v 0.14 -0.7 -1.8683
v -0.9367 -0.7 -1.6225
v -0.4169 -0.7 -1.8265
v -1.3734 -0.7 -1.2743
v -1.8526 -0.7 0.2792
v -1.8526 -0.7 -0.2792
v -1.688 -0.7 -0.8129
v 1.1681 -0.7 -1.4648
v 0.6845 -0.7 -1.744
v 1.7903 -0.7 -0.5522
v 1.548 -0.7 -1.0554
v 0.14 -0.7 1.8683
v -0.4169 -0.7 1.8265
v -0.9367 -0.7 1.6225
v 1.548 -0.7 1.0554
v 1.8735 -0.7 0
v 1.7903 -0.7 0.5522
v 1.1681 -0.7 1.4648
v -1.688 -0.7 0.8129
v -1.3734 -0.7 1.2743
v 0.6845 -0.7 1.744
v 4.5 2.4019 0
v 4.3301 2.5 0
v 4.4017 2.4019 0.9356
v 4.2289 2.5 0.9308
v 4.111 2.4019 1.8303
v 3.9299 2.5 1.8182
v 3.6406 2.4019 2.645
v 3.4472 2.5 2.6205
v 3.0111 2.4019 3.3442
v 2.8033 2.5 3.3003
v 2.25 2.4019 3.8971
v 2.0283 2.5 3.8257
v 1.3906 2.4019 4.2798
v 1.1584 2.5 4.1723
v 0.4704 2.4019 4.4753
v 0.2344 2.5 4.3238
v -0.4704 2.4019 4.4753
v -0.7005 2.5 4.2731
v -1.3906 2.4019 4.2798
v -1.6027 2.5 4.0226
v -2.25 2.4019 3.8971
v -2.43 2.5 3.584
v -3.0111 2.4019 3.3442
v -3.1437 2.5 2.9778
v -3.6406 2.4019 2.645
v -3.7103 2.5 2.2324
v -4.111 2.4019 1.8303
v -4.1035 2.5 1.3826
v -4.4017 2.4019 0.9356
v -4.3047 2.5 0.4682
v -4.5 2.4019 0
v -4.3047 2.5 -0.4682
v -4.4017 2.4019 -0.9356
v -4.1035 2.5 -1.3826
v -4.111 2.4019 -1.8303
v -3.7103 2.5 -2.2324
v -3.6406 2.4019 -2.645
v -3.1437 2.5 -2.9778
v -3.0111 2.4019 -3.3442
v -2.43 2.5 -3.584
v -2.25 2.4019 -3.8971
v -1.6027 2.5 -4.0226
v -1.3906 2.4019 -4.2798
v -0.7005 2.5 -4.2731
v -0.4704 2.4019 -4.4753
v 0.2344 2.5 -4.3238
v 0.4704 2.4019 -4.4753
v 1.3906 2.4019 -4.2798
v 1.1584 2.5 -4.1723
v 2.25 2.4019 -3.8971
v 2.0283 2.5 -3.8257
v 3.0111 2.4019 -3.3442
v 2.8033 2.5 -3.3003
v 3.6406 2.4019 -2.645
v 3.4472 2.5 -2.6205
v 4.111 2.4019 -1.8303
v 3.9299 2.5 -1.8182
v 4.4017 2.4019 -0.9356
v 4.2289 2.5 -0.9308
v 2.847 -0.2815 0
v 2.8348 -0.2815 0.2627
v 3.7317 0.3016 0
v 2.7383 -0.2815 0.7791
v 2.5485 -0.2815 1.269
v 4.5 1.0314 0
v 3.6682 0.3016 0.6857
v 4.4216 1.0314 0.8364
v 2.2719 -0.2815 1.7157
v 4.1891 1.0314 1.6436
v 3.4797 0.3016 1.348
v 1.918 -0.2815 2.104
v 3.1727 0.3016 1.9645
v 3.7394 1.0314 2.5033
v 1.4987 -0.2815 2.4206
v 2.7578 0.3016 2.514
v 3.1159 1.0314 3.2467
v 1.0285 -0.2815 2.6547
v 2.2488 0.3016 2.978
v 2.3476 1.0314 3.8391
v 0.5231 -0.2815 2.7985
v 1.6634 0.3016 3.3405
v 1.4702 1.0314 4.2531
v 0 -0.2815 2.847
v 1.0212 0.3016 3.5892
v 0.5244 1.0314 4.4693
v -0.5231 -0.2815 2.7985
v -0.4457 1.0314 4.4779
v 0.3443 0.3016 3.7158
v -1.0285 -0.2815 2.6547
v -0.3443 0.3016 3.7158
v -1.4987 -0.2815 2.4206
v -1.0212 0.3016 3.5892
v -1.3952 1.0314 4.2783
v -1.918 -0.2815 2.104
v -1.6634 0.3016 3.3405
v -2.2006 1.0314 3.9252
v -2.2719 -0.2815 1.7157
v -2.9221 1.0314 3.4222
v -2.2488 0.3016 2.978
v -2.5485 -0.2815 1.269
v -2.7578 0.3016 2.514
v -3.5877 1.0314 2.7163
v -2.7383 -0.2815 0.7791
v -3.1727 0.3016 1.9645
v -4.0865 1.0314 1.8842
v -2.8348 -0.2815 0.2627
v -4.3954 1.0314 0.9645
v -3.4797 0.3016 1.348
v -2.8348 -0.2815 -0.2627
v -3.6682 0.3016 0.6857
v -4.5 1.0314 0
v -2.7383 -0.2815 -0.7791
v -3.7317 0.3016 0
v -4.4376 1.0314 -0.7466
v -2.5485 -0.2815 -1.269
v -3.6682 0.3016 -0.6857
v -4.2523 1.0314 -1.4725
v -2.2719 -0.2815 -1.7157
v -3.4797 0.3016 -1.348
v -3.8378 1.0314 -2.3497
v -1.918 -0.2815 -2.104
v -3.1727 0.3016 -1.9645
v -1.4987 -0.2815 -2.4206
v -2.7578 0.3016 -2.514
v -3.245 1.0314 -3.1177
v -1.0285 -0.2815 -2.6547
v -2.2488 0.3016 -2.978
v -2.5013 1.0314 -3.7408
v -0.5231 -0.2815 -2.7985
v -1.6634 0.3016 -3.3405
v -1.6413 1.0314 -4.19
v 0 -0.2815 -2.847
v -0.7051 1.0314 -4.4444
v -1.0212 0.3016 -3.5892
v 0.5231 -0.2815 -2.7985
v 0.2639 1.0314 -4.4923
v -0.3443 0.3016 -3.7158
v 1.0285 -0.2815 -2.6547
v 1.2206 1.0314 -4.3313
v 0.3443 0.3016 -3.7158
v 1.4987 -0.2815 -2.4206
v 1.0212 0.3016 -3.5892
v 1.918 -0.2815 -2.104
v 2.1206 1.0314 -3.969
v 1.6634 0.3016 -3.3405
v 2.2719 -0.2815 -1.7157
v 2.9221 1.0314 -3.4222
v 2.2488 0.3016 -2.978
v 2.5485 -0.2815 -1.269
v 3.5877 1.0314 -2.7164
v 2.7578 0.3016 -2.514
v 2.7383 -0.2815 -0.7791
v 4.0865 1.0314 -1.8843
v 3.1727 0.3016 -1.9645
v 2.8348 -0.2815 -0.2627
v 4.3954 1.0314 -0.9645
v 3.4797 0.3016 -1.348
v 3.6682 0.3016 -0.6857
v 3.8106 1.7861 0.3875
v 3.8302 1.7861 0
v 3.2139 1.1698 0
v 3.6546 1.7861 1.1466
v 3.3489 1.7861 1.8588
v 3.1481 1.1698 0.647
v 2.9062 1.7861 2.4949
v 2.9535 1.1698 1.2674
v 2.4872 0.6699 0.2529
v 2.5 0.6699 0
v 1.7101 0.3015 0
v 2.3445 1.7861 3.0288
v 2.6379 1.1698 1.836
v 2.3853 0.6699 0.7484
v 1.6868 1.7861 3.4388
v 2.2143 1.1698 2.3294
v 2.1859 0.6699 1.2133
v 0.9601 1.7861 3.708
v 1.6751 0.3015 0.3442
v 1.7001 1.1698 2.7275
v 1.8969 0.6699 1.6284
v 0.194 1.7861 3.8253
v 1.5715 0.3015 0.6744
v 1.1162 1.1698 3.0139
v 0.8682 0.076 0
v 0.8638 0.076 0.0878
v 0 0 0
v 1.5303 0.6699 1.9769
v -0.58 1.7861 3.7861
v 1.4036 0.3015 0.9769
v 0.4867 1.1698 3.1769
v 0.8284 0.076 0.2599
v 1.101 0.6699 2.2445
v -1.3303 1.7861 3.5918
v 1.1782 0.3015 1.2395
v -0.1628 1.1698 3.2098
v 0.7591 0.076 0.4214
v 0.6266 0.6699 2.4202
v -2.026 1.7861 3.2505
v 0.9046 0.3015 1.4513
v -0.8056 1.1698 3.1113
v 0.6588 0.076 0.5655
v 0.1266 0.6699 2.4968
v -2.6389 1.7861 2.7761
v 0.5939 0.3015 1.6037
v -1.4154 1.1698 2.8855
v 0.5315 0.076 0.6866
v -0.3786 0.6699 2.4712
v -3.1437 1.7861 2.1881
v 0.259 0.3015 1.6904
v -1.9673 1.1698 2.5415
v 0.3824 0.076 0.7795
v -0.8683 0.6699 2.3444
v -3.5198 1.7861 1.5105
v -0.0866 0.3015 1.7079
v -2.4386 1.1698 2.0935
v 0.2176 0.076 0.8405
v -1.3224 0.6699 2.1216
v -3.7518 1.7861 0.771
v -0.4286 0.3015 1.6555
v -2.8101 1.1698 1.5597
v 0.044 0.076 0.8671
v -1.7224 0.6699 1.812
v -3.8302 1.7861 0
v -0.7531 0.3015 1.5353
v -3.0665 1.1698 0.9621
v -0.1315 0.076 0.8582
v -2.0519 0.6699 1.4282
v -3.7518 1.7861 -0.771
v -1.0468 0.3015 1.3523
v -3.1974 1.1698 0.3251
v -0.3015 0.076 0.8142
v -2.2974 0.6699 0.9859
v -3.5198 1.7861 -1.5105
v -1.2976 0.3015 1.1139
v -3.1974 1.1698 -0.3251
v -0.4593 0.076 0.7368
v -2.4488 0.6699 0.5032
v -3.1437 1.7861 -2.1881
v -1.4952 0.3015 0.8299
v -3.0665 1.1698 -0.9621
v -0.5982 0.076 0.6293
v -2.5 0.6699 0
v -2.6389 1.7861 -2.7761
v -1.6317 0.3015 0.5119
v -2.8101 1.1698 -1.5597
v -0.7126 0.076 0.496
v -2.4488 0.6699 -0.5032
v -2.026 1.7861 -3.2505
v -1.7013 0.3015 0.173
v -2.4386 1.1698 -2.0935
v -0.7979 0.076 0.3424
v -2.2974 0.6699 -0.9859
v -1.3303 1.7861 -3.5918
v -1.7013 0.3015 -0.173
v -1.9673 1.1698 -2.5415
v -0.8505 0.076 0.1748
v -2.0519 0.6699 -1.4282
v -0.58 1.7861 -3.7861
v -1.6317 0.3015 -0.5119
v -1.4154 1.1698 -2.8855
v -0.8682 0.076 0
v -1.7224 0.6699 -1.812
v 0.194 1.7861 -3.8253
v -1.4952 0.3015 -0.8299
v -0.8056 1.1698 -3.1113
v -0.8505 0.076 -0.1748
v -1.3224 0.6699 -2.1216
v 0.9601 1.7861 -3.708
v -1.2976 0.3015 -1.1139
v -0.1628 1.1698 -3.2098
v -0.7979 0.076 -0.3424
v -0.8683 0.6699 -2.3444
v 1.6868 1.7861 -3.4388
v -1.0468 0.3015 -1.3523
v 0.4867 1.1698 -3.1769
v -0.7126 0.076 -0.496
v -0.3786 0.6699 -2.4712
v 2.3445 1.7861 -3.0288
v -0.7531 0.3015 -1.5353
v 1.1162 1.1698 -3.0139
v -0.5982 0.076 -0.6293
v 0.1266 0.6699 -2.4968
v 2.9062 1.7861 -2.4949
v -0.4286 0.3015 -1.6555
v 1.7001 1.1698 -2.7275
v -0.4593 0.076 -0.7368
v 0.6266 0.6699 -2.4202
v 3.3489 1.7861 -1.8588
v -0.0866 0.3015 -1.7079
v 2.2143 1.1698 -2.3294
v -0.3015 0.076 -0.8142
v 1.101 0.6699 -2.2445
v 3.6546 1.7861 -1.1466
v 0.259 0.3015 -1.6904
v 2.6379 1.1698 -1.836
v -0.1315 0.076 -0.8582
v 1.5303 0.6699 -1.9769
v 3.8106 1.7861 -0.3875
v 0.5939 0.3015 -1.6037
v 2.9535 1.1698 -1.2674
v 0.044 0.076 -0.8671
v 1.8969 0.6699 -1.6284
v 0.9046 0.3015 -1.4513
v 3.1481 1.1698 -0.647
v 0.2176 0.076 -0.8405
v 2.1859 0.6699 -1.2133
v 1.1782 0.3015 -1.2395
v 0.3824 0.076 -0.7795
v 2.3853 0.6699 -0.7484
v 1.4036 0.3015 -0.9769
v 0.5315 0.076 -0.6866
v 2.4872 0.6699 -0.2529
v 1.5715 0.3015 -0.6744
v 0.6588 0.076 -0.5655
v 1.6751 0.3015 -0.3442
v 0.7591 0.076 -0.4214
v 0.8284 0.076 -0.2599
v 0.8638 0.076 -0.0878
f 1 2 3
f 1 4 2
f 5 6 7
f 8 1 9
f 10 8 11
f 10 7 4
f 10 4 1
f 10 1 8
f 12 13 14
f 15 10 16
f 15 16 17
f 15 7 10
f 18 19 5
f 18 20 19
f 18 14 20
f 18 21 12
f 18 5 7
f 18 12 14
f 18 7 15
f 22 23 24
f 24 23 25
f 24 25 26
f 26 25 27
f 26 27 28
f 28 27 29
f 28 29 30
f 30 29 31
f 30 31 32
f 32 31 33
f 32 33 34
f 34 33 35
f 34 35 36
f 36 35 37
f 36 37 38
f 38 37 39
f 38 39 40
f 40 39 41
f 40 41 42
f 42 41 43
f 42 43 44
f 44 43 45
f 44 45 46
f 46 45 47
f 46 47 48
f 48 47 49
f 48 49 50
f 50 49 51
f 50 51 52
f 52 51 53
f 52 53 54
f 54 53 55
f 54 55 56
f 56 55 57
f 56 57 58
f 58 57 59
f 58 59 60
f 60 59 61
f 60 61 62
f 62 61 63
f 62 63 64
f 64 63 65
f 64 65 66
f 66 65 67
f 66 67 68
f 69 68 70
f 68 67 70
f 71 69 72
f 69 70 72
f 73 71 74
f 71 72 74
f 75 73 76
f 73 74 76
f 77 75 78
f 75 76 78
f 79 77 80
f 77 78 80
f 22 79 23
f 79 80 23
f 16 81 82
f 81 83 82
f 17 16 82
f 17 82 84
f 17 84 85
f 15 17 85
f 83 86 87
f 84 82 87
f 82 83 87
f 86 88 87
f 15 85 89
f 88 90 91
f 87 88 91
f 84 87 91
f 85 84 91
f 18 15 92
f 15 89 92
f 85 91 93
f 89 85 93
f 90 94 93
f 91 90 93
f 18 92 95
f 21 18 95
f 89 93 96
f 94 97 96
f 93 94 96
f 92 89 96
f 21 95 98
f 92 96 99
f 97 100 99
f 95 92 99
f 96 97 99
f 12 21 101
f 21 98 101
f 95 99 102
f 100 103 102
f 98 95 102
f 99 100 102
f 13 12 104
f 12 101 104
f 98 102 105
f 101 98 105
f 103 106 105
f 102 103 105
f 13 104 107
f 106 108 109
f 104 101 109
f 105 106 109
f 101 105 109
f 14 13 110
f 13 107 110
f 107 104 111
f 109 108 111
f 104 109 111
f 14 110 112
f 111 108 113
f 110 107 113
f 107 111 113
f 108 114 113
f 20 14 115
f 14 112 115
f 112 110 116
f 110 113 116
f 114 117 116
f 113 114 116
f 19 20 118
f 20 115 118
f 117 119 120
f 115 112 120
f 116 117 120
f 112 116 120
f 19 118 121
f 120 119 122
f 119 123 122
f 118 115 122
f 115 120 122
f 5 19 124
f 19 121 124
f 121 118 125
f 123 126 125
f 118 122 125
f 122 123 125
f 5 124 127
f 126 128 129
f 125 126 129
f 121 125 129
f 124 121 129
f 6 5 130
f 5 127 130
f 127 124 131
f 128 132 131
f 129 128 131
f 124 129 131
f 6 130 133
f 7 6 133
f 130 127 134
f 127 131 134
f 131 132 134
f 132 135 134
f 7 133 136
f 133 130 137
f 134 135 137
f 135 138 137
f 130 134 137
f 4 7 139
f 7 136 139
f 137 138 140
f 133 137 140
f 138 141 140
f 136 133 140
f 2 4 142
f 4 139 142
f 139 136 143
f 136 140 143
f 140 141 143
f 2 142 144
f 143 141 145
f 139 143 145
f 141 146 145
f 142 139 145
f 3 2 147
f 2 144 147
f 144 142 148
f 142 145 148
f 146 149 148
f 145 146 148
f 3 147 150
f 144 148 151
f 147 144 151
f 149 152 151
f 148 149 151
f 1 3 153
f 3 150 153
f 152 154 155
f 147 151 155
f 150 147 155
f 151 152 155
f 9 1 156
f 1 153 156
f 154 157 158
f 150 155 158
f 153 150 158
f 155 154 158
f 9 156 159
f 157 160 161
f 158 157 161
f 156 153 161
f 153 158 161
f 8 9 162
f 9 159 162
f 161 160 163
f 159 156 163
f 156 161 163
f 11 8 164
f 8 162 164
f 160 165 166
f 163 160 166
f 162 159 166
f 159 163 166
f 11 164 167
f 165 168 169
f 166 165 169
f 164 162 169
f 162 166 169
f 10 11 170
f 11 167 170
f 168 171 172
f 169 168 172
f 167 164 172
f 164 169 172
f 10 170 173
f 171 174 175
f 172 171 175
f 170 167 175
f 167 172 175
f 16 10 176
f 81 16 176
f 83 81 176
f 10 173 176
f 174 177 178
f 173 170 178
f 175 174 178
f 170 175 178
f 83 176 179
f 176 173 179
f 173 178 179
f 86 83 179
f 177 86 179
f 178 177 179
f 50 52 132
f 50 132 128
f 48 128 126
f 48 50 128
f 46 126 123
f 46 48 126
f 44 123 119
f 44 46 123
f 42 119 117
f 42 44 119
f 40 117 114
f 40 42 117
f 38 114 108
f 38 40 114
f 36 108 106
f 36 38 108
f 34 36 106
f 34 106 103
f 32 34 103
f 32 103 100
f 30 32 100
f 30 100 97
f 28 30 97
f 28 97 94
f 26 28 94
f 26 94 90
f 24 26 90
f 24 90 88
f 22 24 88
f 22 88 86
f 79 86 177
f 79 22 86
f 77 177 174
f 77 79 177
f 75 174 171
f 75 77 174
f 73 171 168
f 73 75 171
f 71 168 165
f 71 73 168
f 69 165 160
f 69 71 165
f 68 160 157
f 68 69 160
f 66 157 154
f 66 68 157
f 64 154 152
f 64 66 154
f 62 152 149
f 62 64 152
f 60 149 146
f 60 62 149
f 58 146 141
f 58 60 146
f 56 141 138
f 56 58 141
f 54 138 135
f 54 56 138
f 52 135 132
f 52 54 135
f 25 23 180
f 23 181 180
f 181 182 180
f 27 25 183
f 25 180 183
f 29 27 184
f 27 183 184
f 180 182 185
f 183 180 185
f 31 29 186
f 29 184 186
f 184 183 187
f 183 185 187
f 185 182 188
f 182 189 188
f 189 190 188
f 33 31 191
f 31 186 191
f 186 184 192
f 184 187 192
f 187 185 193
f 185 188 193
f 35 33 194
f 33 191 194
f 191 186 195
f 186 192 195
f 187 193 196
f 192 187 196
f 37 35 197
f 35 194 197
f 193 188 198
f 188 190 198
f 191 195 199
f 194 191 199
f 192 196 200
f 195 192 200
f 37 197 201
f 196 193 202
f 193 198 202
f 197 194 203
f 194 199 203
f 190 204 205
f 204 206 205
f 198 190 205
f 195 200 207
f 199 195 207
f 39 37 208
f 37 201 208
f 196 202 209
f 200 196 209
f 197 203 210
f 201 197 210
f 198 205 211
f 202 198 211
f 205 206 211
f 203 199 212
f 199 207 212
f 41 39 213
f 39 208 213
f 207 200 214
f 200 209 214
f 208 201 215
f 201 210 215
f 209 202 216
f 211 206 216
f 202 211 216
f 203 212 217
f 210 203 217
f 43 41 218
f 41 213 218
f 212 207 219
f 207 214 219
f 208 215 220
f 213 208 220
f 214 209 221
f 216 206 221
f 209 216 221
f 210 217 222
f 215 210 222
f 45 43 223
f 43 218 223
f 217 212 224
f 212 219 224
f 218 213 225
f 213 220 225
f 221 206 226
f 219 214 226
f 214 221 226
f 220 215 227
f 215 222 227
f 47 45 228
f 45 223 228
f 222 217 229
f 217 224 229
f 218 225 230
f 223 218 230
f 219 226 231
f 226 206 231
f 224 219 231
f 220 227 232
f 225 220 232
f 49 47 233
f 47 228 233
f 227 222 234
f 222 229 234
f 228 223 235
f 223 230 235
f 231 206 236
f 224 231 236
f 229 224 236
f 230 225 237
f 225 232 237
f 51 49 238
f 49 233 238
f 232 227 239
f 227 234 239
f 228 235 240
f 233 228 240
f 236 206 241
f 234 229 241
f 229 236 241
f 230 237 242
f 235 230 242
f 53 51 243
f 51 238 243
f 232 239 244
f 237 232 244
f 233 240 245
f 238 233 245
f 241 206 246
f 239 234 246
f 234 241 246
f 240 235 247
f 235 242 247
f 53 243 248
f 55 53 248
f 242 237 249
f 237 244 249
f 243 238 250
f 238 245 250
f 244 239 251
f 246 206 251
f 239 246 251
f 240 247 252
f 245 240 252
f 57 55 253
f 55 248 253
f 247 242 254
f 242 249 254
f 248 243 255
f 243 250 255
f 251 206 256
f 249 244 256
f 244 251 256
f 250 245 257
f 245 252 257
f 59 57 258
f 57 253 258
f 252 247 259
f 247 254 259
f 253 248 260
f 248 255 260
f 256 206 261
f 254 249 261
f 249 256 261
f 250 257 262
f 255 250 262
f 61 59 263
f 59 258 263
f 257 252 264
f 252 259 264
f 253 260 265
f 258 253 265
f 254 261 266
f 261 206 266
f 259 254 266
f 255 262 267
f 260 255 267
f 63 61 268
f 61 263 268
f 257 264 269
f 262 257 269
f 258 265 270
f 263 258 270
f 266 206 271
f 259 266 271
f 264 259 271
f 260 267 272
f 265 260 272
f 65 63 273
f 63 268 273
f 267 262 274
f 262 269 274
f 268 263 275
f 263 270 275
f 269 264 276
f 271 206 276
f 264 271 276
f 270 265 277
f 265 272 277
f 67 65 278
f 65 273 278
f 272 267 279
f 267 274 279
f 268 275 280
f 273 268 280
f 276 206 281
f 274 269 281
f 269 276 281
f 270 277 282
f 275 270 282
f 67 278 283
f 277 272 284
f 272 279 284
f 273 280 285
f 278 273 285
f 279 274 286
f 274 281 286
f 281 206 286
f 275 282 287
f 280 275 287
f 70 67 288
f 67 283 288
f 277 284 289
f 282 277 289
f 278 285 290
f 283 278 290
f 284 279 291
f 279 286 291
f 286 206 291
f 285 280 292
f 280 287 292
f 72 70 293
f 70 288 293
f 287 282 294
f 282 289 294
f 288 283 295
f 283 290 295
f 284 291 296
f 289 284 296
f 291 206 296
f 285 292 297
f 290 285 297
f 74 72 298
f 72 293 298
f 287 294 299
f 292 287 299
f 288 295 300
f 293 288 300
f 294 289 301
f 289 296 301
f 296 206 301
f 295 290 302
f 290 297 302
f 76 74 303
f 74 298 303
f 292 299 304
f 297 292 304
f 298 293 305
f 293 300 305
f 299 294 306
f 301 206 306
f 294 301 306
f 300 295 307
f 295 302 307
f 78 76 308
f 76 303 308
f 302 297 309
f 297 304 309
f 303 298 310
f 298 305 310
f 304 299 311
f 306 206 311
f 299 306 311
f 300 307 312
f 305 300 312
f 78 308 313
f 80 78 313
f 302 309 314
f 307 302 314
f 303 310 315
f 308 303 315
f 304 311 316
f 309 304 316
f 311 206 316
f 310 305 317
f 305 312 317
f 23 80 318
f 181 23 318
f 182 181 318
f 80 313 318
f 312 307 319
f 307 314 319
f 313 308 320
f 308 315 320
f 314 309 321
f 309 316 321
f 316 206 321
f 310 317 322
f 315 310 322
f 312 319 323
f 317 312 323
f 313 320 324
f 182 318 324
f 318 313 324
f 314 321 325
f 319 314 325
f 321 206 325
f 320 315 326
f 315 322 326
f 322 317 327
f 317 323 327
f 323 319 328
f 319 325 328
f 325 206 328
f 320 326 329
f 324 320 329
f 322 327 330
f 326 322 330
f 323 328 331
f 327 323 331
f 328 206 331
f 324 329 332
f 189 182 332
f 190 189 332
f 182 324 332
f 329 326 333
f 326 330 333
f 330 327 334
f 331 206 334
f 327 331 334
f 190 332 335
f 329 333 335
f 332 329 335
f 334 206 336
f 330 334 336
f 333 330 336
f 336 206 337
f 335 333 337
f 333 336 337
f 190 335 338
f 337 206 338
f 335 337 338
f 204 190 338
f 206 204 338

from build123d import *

# Parameters (mm, degrees)
SKETCH_2_W               = 1.902691091
SKETCH_2_H               = 5.293337887
SKETCH_3_W               = 11.904020265
SKETCH_3_H               = 2.403246825
CUT_EXTRUDE_1_DEPTH      = 5.5
CUT_EXTRUDE_1_DEPTH_BACK = 5.5


with BuildPart() as part:
    # Эскиз1 one side → Повернуть1 (revolve)
    with BuildSketch(Plane.XY):
        with BuildLine():
            Line((0, 0), (0, -1))
            ThreePointArc((0, -1), (3, -0.196152423), (5.196152423, 2))
            Line((5.196152423, 2), (4.330127019, 2.5))
            ThreePointArc((4.330127019, 2.5), (2.5, 0.669872981), (0, 0))
        make_face()
    revolve(axis=Axis((0, 0, 0), (0, -1, 0)))

    # Эскиз2 → Вырез-Повернуть1 (revolve, cut)
    with BuildSketch(Plane.XY):
        with Locations((-5.451345546, 1.418725327)):
            Rectangle(SKETCH_2_W, SKETCH_2_H)
    revolve(axis=Axis((0, 0, 0), (0, 1, 0)), mode=Mode.SUBTRACT)

    # Эскиз3 → Вырез-Вытянуть1 (cut, two sides)
    with BuildSketch(Plane.XY) as cut_extrude_1_sk:
        with Locations((-0.172996367, -1.901623413)):
            Rectangle(SKETCH_3_W, SKETCH_3_H)
    extrude(amount=CUT_EXTRUDE_1_DEPTH, mode=Mode.SUBTRACT)
    extrude(cut_extrude_1_sk.sketch, amount=-CUT_EXTRUDE_1_DEPTH_BACK, mode=Mode.SUBTRACT)


solid = part.part
